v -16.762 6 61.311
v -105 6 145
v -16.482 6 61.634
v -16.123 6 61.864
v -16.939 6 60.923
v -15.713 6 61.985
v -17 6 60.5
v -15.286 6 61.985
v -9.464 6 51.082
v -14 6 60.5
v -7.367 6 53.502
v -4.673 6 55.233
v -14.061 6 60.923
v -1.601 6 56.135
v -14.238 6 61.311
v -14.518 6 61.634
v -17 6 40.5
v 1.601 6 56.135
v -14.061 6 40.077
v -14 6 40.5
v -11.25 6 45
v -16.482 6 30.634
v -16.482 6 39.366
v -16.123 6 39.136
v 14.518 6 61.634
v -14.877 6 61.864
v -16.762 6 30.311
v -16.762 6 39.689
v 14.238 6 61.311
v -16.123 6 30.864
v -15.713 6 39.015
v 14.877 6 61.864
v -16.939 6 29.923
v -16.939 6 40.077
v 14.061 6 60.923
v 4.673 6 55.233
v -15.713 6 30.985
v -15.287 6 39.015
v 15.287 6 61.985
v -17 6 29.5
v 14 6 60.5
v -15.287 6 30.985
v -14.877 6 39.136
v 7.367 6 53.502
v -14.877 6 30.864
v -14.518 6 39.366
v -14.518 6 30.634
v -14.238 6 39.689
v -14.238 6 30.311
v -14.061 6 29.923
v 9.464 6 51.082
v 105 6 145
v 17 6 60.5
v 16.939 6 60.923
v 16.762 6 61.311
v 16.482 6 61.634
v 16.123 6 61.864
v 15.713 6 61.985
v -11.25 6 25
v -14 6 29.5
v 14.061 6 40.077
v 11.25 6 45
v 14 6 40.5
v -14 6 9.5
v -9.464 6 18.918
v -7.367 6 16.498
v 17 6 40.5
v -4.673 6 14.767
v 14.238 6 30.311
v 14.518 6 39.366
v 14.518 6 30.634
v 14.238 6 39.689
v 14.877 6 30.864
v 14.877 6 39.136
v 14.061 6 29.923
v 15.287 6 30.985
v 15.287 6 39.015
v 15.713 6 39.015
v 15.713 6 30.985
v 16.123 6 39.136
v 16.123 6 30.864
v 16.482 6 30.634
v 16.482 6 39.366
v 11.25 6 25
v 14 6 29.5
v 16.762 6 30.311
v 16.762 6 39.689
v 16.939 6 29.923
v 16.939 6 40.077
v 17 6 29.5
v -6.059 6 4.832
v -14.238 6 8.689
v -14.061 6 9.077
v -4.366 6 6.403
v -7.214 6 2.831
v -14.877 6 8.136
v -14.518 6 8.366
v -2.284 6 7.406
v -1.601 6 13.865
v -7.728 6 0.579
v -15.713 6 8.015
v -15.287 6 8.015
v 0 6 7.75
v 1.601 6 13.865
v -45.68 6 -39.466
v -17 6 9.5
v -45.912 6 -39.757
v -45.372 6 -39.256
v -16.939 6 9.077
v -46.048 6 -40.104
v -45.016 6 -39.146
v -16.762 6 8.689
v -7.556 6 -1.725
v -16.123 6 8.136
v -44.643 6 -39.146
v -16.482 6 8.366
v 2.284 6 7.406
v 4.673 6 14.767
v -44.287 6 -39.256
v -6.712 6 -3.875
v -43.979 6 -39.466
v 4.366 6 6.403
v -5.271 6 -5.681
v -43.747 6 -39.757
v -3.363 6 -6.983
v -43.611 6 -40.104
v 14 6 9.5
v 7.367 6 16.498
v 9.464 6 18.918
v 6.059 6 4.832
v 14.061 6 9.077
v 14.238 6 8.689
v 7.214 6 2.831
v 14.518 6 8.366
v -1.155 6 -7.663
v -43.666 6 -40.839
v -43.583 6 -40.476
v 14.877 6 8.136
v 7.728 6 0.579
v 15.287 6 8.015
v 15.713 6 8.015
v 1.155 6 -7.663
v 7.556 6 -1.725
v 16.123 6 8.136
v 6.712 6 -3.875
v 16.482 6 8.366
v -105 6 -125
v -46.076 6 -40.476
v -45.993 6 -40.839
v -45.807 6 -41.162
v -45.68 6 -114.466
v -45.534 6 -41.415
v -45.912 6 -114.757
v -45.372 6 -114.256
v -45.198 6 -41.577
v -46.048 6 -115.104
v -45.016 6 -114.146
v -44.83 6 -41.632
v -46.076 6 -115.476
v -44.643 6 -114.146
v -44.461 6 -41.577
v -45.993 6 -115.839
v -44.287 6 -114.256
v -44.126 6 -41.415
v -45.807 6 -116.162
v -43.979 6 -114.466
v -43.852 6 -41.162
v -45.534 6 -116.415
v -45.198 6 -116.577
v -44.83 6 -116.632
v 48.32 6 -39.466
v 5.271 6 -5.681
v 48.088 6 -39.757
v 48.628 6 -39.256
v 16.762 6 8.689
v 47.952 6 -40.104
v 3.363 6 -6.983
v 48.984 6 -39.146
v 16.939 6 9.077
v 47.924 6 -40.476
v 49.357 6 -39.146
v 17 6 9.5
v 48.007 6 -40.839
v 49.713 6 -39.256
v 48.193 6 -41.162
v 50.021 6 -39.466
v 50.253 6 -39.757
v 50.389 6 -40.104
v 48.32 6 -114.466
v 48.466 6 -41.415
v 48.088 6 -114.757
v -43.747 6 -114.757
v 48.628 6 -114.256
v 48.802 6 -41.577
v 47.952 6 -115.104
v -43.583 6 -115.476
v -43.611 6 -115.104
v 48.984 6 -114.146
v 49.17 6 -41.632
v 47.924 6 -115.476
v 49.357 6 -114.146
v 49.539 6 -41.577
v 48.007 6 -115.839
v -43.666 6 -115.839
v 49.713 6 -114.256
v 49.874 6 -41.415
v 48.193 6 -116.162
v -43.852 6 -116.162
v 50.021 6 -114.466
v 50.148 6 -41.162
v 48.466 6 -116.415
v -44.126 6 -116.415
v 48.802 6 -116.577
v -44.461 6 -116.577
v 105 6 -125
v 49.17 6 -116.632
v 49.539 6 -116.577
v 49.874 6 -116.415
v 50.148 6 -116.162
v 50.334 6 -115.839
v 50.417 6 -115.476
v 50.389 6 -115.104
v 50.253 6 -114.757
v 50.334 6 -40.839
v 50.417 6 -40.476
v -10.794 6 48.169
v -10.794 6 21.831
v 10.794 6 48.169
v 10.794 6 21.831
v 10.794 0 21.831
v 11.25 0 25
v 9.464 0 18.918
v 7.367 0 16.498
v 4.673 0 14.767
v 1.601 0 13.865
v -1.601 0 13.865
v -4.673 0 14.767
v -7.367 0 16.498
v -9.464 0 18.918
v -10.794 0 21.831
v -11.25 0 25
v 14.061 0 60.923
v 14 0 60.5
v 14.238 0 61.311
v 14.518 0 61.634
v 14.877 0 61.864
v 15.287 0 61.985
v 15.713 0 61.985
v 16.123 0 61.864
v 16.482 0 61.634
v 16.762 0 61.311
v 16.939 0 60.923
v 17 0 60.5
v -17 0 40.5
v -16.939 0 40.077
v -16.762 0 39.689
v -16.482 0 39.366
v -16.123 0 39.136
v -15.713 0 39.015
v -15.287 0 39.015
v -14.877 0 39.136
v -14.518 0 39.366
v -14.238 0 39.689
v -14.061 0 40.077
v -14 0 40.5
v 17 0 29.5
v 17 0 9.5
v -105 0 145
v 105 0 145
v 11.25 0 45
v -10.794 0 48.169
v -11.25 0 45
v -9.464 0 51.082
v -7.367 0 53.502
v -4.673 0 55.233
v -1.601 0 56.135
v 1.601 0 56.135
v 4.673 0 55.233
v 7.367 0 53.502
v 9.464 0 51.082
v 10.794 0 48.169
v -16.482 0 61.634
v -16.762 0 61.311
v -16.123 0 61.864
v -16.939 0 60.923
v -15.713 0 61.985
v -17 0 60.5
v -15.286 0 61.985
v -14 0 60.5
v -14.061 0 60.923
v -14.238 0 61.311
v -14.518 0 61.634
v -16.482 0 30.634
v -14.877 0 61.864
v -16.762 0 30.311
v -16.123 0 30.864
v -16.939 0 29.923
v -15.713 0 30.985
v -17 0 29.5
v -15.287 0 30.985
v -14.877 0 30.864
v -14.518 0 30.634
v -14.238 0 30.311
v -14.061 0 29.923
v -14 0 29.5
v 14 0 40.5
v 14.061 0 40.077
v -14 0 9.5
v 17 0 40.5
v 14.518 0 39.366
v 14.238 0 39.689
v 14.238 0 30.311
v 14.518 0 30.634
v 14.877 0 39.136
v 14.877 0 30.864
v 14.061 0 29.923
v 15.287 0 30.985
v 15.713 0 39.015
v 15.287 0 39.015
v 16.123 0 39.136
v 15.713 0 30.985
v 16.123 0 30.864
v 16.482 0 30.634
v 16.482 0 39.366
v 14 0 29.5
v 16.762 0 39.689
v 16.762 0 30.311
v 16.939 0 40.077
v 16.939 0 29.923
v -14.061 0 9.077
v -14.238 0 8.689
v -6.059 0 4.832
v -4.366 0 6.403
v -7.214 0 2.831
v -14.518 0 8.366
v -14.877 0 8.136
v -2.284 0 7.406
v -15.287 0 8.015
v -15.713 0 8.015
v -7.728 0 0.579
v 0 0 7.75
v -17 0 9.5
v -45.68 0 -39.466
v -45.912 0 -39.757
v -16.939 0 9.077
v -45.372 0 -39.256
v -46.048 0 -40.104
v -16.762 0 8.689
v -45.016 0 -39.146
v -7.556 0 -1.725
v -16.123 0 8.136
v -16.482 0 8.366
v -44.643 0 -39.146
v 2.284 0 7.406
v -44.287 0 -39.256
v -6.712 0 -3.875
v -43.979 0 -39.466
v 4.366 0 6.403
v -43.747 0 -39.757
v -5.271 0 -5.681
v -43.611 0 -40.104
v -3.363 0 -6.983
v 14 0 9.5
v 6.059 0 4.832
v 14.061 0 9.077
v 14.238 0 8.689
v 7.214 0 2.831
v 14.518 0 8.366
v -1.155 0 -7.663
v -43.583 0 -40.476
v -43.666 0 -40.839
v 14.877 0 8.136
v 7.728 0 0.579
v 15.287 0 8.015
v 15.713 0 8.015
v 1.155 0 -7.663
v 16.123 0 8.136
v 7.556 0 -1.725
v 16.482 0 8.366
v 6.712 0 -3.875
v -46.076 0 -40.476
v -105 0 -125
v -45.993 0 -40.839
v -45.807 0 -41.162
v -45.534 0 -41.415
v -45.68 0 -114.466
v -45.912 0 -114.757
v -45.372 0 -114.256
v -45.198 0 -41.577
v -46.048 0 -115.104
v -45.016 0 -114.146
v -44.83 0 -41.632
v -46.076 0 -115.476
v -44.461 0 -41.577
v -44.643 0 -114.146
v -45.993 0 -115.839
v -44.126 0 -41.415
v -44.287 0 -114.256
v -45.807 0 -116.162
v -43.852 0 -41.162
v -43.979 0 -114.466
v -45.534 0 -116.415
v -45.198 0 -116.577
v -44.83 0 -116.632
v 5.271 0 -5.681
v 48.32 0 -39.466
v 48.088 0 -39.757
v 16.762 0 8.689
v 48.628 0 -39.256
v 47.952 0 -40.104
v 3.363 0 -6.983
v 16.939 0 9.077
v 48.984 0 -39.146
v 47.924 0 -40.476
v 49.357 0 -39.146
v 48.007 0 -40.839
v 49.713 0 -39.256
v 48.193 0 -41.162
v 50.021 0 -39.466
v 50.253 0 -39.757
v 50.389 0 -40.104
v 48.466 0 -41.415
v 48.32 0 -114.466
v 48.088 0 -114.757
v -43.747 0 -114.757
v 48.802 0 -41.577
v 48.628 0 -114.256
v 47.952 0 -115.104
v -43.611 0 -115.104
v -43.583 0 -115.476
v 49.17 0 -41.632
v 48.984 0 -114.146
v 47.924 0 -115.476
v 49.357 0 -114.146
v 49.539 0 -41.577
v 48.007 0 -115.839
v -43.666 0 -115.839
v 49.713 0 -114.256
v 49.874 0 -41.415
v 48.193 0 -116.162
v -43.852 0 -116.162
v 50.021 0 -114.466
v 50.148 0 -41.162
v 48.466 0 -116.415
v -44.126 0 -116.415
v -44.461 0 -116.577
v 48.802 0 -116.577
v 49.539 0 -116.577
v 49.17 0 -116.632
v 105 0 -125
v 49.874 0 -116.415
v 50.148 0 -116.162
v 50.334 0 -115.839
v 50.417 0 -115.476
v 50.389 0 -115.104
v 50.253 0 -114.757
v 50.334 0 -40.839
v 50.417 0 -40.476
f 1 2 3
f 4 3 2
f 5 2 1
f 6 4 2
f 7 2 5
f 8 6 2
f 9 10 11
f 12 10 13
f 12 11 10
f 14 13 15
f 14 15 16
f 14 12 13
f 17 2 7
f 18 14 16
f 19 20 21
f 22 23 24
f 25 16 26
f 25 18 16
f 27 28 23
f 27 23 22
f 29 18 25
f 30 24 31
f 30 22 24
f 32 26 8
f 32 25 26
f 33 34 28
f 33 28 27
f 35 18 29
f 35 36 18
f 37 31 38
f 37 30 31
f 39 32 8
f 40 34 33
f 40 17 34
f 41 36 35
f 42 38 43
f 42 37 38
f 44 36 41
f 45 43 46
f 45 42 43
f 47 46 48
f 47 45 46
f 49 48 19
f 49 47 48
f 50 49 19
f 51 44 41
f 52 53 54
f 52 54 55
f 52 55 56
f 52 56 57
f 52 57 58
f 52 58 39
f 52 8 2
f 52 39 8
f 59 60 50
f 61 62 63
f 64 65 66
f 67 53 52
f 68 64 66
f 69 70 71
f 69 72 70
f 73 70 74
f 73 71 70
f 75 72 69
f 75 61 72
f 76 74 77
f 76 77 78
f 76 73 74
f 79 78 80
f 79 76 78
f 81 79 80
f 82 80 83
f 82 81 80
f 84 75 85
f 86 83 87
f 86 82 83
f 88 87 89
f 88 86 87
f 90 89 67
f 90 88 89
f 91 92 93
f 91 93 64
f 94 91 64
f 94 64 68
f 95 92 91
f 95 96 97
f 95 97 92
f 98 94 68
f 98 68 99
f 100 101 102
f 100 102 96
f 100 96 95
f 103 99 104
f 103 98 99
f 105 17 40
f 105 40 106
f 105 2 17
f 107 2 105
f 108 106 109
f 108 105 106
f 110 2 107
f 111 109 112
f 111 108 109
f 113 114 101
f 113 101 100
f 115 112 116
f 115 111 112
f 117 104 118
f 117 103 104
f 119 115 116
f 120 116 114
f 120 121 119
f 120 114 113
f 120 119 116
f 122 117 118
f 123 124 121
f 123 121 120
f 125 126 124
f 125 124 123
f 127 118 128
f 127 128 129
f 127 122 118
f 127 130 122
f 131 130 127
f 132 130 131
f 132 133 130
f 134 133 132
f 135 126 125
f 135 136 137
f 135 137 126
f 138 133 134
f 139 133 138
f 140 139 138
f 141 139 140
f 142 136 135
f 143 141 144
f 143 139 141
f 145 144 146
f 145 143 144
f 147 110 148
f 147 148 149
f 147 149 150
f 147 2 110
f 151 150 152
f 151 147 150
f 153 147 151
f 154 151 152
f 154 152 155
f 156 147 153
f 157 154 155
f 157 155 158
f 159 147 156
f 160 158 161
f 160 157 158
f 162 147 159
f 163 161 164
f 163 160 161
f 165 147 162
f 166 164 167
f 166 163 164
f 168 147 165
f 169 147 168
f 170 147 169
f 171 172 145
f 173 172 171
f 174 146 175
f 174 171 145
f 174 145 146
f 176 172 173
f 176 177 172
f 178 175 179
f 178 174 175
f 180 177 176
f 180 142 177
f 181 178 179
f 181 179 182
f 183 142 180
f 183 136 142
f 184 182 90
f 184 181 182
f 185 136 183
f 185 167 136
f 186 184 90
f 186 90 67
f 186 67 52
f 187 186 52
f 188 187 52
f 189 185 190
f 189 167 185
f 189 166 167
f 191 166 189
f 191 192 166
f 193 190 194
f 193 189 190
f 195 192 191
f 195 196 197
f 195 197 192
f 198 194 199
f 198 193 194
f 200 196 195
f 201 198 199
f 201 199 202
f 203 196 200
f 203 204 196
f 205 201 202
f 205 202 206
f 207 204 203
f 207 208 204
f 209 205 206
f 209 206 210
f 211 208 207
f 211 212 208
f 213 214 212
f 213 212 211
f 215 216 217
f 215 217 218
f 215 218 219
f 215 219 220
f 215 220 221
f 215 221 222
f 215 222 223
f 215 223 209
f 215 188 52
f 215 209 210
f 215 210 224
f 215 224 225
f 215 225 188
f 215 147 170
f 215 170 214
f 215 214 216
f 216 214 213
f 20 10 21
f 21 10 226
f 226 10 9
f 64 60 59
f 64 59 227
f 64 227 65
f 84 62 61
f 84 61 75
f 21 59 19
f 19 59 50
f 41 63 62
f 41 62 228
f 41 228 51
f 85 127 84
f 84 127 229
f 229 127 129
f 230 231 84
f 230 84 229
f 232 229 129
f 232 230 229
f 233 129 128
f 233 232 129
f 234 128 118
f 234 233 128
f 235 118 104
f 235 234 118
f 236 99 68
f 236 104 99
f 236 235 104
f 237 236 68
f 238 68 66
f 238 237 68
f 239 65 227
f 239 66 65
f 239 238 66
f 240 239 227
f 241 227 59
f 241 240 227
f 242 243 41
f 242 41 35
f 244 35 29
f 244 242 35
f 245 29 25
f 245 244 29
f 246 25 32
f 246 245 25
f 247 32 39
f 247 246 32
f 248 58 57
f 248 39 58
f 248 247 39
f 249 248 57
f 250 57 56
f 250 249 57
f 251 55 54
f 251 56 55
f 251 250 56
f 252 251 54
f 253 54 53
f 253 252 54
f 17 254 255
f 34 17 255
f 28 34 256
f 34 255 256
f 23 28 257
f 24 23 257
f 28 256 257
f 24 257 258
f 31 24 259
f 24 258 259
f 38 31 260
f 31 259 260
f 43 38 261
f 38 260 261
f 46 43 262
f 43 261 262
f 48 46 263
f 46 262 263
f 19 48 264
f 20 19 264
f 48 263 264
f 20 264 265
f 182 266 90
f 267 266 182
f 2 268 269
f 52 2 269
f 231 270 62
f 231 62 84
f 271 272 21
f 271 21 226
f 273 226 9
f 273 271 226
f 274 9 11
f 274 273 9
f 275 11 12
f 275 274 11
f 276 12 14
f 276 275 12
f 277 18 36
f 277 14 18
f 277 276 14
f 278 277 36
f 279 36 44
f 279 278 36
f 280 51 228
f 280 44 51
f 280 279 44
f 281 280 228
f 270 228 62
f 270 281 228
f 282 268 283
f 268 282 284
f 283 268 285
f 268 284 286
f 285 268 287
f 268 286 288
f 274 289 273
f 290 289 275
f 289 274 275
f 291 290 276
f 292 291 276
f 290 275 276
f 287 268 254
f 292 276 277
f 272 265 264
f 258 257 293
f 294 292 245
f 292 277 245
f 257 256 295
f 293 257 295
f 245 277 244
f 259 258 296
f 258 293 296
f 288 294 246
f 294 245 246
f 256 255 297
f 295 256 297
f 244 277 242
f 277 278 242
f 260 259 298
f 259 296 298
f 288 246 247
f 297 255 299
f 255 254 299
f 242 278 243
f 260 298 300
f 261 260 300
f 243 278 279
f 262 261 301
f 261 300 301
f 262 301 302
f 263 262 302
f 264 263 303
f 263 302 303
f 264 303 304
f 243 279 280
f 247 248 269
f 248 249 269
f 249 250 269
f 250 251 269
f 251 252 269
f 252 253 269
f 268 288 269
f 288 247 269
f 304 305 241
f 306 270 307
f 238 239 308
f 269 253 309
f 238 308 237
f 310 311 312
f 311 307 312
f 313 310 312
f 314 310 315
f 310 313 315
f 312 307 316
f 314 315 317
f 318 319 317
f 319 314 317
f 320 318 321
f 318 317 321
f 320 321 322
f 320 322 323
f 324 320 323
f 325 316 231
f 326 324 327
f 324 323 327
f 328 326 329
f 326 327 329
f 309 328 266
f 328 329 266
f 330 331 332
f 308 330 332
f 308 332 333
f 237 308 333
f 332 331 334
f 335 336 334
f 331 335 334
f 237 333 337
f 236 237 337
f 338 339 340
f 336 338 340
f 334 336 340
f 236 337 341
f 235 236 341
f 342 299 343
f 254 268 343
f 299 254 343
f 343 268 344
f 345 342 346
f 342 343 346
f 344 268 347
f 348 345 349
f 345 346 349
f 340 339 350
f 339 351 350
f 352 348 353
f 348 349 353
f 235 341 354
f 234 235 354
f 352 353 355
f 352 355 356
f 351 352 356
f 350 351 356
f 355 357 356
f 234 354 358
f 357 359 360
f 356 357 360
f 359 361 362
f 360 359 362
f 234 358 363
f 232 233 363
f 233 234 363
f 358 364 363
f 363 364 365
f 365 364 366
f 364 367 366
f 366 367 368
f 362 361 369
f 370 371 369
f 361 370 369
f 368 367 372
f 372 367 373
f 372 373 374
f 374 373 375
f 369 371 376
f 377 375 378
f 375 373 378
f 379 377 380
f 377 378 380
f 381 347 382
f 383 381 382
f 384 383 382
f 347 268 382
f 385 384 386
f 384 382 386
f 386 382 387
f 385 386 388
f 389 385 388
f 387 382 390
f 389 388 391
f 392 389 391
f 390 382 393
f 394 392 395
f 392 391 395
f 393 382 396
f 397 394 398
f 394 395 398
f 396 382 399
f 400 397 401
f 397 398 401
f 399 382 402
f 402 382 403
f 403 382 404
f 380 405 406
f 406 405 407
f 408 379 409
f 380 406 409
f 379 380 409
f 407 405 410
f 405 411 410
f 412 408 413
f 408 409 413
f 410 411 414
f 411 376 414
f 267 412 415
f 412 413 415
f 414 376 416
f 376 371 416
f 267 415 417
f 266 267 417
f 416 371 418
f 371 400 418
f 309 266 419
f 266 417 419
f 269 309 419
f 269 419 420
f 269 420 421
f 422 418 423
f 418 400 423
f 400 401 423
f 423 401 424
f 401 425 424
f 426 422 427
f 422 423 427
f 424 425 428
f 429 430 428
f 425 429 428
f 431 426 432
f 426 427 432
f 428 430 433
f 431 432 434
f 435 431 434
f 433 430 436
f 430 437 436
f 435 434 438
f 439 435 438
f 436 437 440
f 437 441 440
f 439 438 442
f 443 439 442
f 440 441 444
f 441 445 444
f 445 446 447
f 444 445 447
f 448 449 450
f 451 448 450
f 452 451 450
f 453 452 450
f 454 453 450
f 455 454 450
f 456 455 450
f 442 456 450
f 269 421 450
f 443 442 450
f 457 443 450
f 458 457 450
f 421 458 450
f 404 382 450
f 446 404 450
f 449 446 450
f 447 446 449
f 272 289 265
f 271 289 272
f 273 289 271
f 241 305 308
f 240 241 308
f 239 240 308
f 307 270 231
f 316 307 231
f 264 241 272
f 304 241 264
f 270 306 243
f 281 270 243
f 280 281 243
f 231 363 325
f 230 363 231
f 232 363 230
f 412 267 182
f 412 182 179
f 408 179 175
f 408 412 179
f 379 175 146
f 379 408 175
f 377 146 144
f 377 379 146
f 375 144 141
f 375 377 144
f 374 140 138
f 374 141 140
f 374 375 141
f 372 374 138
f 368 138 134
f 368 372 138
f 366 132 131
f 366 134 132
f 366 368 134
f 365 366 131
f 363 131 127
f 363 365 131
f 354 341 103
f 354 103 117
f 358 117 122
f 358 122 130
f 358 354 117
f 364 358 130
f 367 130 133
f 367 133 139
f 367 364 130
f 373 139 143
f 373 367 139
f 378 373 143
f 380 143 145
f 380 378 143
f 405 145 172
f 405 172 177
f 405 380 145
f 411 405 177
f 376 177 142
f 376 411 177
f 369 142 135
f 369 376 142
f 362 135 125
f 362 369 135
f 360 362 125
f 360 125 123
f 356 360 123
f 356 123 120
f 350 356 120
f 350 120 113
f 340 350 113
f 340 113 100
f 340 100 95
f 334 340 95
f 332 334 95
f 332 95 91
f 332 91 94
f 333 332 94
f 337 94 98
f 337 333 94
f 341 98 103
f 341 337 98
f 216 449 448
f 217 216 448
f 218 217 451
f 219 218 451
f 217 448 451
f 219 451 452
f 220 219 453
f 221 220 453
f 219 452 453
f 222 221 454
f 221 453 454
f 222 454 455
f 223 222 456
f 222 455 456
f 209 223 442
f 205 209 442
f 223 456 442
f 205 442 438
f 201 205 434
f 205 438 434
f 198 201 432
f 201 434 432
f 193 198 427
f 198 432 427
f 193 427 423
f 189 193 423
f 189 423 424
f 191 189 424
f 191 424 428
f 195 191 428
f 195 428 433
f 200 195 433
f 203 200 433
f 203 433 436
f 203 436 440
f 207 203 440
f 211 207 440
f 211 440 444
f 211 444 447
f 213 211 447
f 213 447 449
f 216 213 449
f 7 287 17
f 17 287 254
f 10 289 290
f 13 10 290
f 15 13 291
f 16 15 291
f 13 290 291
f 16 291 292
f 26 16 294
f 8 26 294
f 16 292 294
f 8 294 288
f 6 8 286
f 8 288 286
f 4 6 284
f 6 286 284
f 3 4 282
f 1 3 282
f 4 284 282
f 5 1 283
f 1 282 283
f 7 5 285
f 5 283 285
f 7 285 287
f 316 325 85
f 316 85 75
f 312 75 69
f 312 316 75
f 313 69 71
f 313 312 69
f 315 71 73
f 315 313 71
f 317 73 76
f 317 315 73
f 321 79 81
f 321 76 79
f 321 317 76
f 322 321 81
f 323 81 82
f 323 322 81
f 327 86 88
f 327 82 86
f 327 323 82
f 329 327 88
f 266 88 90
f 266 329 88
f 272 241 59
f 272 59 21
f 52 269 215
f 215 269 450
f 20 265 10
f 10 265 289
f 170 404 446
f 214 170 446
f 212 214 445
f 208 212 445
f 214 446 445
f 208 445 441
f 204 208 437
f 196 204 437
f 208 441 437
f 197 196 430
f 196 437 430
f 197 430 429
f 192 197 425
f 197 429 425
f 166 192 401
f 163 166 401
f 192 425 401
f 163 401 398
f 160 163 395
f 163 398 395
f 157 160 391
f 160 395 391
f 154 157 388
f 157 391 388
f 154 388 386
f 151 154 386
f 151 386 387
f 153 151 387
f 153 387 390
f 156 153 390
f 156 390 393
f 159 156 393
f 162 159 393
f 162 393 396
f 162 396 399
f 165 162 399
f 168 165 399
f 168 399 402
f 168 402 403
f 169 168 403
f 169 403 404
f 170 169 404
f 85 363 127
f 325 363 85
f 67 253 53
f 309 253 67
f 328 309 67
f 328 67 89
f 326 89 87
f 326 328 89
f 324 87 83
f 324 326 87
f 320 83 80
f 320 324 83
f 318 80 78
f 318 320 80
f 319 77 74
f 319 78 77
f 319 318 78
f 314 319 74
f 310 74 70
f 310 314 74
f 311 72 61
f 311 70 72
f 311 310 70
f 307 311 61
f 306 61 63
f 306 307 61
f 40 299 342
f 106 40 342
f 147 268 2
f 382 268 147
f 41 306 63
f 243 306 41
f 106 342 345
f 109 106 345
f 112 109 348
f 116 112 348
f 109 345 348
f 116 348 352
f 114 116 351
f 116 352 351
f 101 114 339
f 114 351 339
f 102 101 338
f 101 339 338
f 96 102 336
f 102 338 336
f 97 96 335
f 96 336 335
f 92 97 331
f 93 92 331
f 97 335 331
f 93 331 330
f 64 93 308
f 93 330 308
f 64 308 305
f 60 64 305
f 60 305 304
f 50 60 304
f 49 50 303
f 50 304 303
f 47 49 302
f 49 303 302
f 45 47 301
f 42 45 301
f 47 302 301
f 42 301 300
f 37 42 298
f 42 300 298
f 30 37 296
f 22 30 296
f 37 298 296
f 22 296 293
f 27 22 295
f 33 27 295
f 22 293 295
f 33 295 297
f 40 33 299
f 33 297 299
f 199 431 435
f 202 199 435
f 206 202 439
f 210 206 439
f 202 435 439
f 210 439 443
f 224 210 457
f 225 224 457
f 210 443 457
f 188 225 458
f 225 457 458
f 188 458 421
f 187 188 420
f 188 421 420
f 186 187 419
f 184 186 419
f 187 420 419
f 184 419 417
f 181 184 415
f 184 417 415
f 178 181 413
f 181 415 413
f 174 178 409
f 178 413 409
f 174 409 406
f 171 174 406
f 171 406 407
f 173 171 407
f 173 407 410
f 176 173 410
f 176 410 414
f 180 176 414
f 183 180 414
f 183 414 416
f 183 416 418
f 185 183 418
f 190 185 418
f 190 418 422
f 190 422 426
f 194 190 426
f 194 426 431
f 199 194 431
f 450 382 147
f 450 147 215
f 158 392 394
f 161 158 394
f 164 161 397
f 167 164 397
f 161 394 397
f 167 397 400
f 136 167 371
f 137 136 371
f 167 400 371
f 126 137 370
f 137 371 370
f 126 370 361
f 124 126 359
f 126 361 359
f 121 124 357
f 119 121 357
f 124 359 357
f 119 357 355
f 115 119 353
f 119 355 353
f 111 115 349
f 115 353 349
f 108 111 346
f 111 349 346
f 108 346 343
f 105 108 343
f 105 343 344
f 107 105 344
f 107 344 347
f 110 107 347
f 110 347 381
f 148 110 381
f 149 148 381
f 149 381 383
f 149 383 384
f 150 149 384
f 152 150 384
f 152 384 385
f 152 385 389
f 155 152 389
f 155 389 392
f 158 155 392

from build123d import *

# Parameters (mm, degrees)
SKETCH1_W           = 210
SKETCH1_H           = 270
SKETCH1_R           = 7.75
BOSS_EXTRUDE2_DEPTH = 6
CUT_EXTRUDE1_DEPTH  = 10
SKETCH4_R           = 1.25
CUT_EXTRUDE2_DEPTH  = 10


with BuildPart() as part:
    # Sketch1 → Boss-Extrude2 (new body)
    with BuildSketch(Plane(origin=(0, 0, 0), x_dir=(1, 0, 0), z_dir=(0, 1, 0))):
        with Locations((0, -10)):
            Rectangle(SKETCH1_W, SKETCH1_H)
        with Locations(Location((0, 0, 0), (0, 0, 270))):
            Circle(SKETCH1_R, mode=Mode.SUBTRACT)
    extrude(amount=BOSS_EXTRUDE2_DEPTH)

    # Sketch3 → Cut-Extrude1 (cut)
    with BuildSketch(Plane.XZ):
        with BuildLine():
            Line((17.000022153, 29.5), (17.000022153, 9.5))
            ThreePointArc((17.000022153, 9.5), (15.500022153, 8), (14.000022153, 9.5))
            Line((14.000022153, 9.5), (14.000022153, 29.5))
            ThreePointArc((14.000022153, 29.5), (15.500022153, 31), (17.000022153, 29.5))
        make_face()
        with BuildLine():
            Line((17.000022153, 60.5), (17.000022153, 40.5))
            ThreePointArc((17.000022153, 40.5), (15.500022153, 39), (14.000022153, 40.5))
            Line((14.000022153, 40.5), (14.000022153, 60.5))
            ThreePointArc((14.000022153, 60.5), (15.500022153, 62), (17.000022153, 60.5))
        make_face()
        with BuildLine():
            Line((-16.999993108, 29.500016738), (-17.0000128, 9.500016738))
            ThreePointArc((-17.0000128, 9.500016738), (-15.500014277, 8.000015261), (-14.0000128, 9.500013784))
            Line((-14.0000128, 9.500013784), (-13.999993108, 29.500013784))
            ThreePointArc((-13.999993108, 29.500013784), (-15.499991631, 31.000015261), (-16.999993108, 29.500016738))
        make_face()
        with BuildLine():
            Line((-16.999962586, 60.500016738), (-16.999982277, 40.500016738))
            ThreePointArc((-16.999982277, 40.500016738), (-15.499983754, 39.000015261), (-13.999982277, 40.500013784))
            Line((-13.999982277, 40.500013784), (-13.999962586, 60.500013784))
            ThreePointArc((-13.999962586, 60.500013784), (-15.499961109, 62.000015261), (-16.999962586, 60.500016738))
        make_face()
        with BuildLine():
            Line((11.250022153, 44.999994462), (11.250012307, 24.999994462))
            ThreePointArc((11.250012307, 24.999994462), (6.769e-06, 13.75), (-11.249987693, 25.000005538))
            Line((-11.249987693, 25.000005538), (-11.249977847, 45.000005538))
            ThreePointArc((-11.249977847, 45.000005538), (2.7692e-05, 56.25), (11.250022153, 44.999994462))
        make_face()
    extrude(amount=-CUT_EXTRUDE1_DEPTH, mode=Mode.SUBTRACT)

    # Sketch4 → Cut-Extrude2 (cut)
    with BuildSketch(Plane.XZ):
        with Locations(Location((49.170333674, -115.382230576, 0), (0, 0, 270))):
            Circle(SKETCH4_R)
        with Locations(Location((-44.829666326, -115.382230576, 0), (0, 0, 270))):
            Circle(SKETCH4_R)
        with Locations(Location((49.170333674, -40.382230576, 0), (0, 0, 270))):
            Circle(SKETCH4_R)
        with Locations(Location((-44.829666326, -40.382230576, 0), (0, 0, 270))):
            Circle(SKETCH4_R)
    extrude(amount=-CUT_EXTRUDE2_DEPTH, mode=Mode.SUBTRACT)


solid = part.part
